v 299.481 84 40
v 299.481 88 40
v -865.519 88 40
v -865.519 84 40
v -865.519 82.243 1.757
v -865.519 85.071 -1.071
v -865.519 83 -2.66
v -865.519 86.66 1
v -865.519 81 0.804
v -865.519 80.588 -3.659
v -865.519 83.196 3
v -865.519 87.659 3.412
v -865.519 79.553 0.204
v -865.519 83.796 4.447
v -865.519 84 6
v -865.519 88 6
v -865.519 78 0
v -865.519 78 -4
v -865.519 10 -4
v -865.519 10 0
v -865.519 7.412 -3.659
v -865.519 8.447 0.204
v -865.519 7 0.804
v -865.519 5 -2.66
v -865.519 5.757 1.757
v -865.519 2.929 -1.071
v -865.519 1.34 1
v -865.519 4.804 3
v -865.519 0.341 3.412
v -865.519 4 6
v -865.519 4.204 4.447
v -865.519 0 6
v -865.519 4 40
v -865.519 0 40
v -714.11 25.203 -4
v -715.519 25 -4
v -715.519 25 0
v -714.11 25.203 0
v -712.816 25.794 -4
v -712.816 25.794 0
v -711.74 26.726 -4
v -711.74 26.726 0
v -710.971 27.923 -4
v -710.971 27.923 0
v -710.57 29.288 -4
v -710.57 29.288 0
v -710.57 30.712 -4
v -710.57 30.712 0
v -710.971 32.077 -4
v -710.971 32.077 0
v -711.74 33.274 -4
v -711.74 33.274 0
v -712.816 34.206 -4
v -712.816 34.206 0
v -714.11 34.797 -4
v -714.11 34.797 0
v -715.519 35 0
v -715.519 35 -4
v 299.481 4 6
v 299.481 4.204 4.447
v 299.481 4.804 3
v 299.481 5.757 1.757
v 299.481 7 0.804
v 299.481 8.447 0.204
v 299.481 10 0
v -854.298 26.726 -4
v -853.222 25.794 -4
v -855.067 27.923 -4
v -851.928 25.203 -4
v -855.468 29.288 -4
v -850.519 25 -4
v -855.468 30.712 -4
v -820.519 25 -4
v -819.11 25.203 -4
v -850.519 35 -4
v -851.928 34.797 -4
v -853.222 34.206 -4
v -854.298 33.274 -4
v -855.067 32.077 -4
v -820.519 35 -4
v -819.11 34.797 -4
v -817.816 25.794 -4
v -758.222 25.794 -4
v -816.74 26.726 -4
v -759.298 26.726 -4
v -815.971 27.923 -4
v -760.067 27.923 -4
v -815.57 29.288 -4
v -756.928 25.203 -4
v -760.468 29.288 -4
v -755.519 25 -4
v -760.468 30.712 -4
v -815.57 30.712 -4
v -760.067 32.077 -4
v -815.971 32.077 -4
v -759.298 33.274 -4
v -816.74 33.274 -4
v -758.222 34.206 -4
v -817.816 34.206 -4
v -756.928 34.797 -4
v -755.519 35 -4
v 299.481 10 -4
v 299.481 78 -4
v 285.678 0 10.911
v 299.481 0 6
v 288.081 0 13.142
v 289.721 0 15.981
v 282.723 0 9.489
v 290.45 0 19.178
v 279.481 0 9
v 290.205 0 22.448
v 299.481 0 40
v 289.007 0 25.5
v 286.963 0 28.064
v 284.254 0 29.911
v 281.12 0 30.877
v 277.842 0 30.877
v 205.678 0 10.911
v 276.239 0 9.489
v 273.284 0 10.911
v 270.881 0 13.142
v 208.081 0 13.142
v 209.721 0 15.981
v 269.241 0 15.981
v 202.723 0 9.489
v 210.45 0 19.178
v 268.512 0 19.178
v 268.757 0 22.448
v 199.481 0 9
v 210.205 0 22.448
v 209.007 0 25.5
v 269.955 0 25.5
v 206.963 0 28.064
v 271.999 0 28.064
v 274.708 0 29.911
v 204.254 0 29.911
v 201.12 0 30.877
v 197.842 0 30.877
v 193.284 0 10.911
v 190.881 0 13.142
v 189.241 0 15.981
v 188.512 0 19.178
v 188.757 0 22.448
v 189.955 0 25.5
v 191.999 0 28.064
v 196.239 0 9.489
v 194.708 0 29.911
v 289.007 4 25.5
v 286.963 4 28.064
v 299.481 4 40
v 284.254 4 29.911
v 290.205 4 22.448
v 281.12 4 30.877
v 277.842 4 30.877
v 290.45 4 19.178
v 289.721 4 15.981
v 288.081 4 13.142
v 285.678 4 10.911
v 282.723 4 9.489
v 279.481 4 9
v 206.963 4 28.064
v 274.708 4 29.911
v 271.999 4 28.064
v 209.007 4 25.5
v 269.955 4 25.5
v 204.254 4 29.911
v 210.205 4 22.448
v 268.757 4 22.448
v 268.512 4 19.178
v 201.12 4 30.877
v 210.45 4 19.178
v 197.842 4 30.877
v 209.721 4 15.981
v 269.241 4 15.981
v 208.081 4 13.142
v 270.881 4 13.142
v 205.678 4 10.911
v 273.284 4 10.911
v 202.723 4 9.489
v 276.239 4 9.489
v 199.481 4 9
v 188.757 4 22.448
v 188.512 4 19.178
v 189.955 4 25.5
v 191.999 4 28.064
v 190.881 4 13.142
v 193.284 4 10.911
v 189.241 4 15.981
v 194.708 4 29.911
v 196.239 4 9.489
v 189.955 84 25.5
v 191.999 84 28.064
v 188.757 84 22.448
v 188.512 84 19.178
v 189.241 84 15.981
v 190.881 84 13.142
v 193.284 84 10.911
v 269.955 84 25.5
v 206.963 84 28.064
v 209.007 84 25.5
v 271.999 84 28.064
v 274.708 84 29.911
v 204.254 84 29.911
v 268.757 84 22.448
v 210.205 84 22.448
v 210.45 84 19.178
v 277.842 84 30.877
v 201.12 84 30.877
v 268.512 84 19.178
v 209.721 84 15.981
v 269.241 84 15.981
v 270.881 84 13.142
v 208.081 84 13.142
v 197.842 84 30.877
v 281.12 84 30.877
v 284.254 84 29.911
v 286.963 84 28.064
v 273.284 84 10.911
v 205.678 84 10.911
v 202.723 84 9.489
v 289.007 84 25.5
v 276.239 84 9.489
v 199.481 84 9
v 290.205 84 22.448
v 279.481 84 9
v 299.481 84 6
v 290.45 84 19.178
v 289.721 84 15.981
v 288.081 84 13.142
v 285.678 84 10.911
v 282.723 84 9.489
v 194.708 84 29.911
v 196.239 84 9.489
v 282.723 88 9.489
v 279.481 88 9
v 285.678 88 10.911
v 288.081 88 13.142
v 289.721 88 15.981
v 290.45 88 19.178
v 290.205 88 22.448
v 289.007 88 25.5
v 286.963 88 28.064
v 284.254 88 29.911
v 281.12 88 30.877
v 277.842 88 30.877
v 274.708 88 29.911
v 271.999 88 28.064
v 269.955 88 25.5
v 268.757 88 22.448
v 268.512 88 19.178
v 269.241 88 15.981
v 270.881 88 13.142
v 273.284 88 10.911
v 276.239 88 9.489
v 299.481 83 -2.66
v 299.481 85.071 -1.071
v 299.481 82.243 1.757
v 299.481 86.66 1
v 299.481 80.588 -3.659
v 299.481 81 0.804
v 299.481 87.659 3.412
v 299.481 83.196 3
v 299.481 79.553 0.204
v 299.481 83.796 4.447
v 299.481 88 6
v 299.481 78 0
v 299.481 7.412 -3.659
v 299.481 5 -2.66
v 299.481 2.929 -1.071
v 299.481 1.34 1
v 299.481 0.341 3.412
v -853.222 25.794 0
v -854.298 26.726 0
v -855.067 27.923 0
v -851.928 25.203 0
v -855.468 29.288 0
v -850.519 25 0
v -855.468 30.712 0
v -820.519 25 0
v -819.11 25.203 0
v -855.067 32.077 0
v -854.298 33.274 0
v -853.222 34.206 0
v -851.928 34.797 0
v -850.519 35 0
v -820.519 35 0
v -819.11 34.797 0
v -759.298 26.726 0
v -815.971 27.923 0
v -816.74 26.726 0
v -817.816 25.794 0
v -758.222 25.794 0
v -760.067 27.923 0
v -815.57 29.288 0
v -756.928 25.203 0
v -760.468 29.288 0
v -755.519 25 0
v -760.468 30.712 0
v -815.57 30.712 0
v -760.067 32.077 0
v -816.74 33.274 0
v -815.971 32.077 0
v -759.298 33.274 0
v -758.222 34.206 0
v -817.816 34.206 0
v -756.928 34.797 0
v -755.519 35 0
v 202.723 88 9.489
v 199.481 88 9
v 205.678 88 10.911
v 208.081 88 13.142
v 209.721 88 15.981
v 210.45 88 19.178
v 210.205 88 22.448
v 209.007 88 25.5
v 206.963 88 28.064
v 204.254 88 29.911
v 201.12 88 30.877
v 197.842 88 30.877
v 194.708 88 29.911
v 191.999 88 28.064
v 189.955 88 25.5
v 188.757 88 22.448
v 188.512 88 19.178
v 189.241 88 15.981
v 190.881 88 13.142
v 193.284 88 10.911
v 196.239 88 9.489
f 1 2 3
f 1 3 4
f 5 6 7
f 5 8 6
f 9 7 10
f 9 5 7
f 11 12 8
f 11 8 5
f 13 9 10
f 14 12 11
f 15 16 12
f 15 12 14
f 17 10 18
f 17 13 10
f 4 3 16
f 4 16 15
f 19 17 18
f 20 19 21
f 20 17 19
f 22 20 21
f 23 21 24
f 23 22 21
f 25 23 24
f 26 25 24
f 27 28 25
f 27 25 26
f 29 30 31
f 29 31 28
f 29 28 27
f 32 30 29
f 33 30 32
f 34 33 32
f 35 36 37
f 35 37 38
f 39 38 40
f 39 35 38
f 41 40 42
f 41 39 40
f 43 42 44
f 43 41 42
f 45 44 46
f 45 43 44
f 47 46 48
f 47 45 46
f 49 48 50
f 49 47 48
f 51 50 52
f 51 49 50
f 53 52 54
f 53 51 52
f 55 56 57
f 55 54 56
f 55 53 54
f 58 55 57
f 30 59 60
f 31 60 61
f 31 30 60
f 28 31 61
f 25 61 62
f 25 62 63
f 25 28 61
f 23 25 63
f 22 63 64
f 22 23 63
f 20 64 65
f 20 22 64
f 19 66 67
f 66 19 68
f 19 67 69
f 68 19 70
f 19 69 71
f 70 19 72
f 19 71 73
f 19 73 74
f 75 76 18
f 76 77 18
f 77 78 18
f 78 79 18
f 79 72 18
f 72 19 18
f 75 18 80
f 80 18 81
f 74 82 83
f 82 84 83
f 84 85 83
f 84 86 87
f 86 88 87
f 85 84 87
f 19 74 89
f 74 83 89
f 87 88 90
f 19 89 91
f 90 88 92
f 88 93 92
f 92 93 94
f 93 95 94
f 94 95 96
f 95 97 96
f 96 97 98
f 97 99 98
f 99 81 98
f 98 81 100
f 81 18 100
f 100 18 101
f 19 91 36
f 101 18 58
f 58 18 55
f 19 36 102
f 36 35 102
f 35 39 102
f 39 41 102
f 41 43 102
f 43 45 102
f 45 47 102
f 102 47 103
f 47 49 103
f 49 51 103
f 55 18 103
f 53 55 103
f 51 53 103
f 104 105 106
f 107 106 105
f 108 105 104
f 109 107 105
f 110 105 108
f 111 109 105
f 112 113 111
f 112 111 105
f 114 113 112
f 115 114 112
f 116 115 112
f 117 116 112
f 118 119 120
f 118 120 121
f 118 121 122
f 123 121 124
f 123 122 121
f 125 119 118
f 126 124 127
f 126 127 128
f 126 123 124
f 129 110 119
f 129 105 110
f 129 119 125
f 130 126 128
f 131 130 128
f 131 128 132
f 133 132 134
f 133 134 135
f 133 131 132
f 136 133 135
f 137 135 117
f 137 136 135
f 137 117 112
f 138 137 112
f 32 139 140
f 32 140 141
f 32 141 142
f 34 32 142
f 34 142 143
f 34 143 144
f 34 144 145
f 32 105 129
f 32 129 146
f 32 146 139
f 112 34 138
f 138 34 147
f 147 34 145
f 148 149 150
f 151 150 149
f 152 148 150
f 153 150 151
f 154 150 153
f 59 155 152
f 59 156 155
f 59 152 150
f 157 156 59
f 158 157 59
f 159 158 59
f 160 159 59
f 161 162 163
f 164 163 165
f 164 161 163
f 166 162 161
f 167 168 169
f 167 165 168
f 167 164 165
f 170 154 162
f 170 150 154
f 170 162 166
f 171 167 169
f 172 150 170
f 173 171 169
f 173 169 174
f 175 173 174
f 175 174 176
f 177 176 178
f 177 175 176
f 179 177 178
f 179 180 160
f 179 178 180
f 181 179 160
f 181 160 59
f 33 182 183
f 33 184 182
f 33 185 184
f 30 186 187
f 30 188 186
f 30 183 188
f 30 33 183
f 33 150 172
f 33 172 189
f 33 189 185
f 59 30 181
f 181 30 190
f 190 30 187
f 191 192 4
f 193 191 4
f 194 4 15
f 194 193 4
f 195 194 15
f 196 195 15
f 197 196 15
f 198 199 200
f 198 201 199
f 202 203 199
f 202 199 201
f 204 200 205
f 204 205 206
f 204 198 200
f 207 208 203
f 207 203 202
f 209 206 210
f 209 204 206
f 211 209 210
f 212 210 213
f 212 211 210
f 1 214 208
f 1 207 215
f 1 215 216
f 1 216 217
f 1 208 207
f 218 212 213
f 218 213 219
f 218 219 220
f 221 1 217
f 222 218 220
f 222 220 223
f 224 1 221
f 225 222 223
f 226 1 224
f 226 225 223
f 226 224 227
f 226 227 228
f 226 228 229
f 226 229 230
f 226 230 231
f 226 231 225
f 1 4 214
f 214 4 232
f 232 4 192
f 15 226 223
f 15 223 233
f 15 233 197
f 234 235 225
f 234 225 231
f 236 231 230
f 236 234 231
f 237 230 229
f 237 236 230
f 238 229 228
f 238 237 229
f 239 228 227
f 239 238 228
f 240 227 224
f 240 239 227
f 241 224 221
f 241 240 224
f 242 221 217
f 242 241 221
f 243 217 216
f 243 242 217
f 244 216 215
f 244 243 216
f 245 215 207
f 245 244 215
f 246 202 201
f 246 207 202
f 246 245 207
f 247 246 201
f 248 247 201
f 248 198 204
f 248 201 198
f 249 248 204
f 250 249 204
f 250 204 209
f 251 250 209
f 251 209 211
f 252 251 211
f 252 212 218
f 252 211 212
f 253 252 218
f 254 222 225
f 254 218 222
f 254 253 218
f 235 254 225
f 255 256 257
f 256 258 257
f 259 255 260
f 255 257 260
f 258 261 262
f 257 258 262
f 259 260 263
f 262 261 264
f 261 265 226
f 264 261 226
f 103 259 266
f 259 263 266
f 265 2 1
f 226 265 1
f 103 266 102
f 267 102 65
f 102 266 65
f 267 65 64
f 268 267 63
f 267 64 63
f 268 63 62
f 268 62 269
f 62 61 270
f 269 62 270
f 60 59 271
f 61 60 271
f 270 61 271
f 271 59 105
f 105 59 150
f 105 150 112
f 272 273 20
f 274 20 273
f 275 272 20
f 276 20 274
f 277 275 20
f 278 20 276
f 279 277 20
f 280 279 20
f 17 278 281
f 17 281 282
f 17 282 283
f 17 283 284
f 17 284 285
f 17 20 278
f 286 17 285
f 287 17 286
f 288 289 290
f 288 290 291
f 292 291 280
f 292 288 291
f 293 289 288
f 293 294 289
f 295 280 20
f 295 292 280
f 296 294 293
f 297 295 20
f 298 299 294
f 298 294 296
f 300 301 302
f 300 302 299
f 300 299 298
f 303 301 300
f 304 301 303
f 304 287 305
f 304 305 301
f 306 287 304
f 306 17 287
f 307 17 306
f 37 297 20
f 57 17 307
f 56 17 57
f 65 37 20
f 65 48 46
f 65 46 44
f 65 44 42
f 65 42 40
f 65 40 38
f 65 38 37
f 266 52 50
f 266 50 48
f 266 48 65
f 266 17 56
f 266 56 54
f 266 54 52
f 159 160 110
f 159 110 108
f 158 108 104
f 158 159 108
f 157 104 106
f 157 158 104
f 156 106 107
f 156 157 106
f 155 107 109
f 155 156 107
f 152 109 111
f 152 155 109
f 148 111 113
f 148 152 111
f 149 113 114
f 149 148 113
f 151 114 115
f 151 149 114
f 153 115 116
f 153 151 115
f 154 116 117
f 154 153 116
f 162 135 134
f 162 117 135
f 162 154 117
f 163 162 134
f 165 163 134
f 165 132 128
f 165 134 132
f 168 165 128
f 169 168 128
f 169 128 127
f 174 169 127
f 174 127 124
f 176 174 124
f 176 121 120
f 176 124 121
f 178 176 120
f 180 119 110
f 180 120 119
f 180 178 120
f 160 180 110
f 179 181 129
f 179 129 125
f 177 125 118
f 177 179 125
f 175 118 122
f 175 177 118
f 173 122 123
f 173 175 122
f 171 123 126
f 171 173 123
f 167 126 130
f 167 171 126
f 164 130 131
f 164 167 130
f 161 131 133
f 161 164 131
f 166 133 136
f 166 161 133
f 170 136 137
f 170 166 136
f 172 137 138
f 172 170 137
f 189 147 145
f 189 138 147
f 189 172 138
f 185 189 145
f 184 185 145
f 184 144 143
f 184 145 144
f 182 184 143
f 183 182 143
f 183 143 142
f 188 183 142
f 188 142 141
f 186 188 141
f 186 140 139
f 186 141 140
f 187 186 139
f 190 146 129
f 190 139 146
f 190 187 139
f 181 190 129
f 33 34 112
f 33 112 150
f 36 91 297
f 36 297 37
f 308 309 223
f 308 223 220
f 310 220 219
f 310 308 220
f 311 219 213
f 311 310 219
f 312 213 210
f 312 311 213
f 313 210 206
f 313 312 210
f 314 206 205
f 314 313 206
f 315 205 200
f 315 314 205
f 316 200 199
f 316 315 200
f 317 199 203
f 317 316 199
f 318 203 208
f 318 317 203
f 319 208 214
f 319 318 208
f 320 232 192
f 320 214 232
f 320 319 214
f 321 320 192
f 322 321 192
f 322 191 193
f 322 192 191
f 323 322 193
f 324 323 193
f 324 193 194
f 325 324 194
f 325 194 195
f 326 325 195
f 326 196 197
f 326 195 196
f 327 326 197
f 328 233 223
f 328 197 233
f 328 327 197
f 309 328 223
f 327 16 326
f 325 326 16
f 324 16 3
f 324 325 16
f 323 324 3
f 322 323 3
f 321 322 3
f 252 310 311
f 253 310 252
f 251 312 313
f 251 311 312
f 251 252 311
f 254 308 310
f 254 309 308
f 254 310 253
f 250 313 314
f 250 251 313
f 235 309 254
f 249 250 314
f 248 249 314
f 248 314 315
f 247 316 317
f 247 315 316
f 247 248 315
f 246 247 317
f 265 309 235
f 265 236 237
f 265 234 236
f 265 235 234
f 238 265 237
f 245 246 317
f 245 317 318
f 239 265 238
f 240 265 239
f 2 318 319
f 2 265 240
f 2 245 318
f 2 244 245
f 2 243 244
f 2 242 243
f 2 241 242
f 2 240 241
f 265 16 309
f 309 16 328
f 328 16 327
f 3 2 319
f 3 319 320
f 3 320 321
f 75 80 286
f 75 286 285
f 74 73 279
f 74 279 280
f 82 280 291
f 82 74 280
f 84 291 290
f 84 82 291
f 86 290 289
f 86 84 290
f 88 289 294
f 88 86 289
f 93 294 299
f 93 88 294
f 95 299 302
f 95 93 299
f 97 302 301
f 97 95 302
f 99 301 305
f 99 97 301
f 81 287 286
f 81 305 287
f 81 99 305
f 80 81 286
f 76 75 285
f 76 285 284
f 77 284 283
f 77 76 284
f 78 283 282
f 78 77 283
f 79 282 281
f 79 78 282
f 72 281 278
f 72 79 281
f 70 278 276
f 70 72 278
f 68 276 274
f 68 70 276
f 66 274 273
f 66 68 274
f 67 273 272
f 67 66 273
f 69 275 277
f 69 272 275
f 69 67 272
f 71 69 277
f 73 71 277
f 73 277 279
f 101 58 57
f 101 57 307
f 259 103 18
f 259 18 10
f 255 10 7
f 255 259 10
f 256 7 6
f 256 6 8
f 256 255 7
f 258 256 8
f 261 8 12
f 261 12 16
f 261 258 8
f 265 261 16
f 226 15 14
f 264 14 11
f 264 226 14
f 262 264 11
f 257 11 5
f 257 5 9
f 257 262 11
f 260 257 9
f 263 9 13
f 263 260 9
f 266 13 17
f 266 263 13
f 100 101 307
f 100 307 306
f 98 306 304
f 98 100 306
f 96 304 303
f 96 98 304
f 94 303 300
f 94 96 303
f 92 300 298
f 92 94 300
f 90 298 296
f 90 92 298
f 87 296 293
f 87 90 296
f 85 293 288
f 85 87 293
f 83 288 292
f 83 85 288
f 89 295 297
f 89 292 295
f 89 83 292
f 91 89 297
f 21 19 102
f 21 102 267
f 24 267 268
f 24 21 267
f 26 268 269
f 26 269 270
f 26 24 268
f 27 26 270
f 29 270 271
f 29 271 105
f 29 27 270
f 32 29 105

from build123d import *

# Parameters (mm, degrees)
SKETCH1_W                    = 1165
SKETCH1_H                    = 88
BASE_FLANGE1_DEPTH           = 4
EDGE_FLANGE1_STRIP_W         = 28
EDGE_FLANGE1_STRIP_H         = 4
EDGE_FLANGE1_STRIP_CUT_DEPTH = 1165
EDGE_FLANGE1_DEPTH           = 1165
EDGE_FLANGE2_STRIP_W         = 28
EDGE_FLANGE2_STRIP_H         = 4
EDGE_FLANGE2_STRIP_CUT_DEPTH = 1165
EDGE_FLANGE2_DEPTH           = 1165
CUT_EXTRUDE1_DEPTH           = 871.900176512
CUT_EXTRUDE1_DEPTH_BACK      = 871.900176512
SKETCH12_R                   = 11
CUT_EXTRUDE2_DEPTH           = 872.093059006


# Sheet-metal steps are written as plain solids
with BuildPart() as part:
    # Sketch1 → Base-Flange1 (new body)
    with BuildSketch(Plane.XY):
        with Locations((-283.018987342, 44)):
            Rectangle(SKETCH1_W, SKETCH1_H)
    extrude(amount=-BASE_FLANGE1_DEPTH)

    # Edge-Flange1 strip (across the edge) → Edge-Flange1 strip cut (cut)
    with BuildSketch(Plane(origin=(299.481012658, 88, 0), x_dir=(0, -1, 0), z_dir=(-1, 0, 0))):
        with Locations((-4, -2)):
            Rectangle(EDGE_FLANGE1_STRIP_W, EDGE_FLANGE1_STRIP_H)
    extrude(amount=EDGE_FLANGE1_STRIP_CUT_DEPTH, mode=Mode.SUBTRACT)

    # Edge-Flange1 section (across the edge) → Edge-Flange1 (add)
    with BuildSketch(Plane(origin=(299.481012658, 88, 0), x_dir=(0, -1, 0), z_dir=(-1, 0, 0))):
        with BuildLine():
            Line((0, 6), (0, 40))
            Line((0, 40), (4, 40))
            Line((4, 40), (4, 6))
            ThreePointArc((4, 6), (5.757359313, 1.757359313), (10, 0))
            Line((10, 0), (10, -4))
            ThreePointArc((10, -4), (2.928932188, -1.071067812), (0, 6))
        make_face()
    extrude(amount=EDGE_FLANGE1_DEPTH)

    # Edge-Flange2 strip (across the edge) → Edge-Flange2 strip cut (cut)
    with BuildSketch(Plane.YZ.offset(-865.518987342)):
        with Locations((-4, -2)):
            Rectangle(EDGE_FLANGE2_STRIP_W, EDGE_FLANGE2_STRIP_H)
    extrude(amount=EDGE_FLANGE2_STRIP_CUT_DEPTH, mode=Mode.SUBTRACT)

    # Edge-Flange2 section (across the edge) → Edge-Flange2 (add)
    with BuildSketch(Plane.YZ.offset(-865.518987342)):
        with BuildLine():
            Line((0, 6), (0, 40))
            Line((0, 40), (4, 40))
            Line((4, 40), (4, 6))
            ThreePointArc((4, 6), (5.757359313, 1.757359313), (10, 0))
            Line((10, 0), (10, -4))
            ThreePointArc((10, -4), (2.928932188, -1.071067812), (0, 6))
        make_face()
    extrude(amount=EDGE_FLANGE2_DEPTH)

    # Sketch12 → Cut-Extrude1 (cut, two sides: drawn at the far end of the back side and taken through both)
    with BuildSketch(Plane.XZ.offset(-CUT_EXTRUDE1_DEPTH_BACK)):
        with Locations(Location((279.481012658, 20, 0), (0, 0, 270))):
            Circle(SKETCH12_R)
        with Locations(Location((199.481012658, 20, 0), (0, 0, 270))):
            Circle(SKETCH12_R)
    extrude(amount=CUT_EXTRUDE1_DEPTH + CUT_EXTRUDE1_DEPTH_BACK, mode=Mode.SUBTRACT)

    # Sketch13 → Cut-Extrude2 (cut, through all)
    with BuildSketch(Plane(origin=(0, 0, -4), x_dir=(-1, 0, 0), z_dir=(0, 0, -1))):
        with BuildLine():
            Line((850.518987342, 25), (820.518987342, 25))
            ThreePointArc((820.518987342, 25), (815.518987342, 30), (820.518987342, 35))
            Line((820.518987342, 35), (850.518987342, 35))
            ThreePointArc((850.518987342, 35), (855.518987342, 30), (850.518987342, 25))
        make_face()
        with BuildLine():
            Line((755.518987342, 25), (715.518987342, 25))
            ThreePointArc((715.518987342, 25), (710.518987342, 30), (715.518987342, 35))
            Line((715.518987342, 35), (755.518987342, 35))
            ThreePointArc((755.518987342, 35), (760.518987342, 30), (755.518987342, 25))
        make_face()
    extrude(amount=-CUT_EXTRUDE2_DEPTH, mode=Mode.SUBTRACT)


solid = part.part
